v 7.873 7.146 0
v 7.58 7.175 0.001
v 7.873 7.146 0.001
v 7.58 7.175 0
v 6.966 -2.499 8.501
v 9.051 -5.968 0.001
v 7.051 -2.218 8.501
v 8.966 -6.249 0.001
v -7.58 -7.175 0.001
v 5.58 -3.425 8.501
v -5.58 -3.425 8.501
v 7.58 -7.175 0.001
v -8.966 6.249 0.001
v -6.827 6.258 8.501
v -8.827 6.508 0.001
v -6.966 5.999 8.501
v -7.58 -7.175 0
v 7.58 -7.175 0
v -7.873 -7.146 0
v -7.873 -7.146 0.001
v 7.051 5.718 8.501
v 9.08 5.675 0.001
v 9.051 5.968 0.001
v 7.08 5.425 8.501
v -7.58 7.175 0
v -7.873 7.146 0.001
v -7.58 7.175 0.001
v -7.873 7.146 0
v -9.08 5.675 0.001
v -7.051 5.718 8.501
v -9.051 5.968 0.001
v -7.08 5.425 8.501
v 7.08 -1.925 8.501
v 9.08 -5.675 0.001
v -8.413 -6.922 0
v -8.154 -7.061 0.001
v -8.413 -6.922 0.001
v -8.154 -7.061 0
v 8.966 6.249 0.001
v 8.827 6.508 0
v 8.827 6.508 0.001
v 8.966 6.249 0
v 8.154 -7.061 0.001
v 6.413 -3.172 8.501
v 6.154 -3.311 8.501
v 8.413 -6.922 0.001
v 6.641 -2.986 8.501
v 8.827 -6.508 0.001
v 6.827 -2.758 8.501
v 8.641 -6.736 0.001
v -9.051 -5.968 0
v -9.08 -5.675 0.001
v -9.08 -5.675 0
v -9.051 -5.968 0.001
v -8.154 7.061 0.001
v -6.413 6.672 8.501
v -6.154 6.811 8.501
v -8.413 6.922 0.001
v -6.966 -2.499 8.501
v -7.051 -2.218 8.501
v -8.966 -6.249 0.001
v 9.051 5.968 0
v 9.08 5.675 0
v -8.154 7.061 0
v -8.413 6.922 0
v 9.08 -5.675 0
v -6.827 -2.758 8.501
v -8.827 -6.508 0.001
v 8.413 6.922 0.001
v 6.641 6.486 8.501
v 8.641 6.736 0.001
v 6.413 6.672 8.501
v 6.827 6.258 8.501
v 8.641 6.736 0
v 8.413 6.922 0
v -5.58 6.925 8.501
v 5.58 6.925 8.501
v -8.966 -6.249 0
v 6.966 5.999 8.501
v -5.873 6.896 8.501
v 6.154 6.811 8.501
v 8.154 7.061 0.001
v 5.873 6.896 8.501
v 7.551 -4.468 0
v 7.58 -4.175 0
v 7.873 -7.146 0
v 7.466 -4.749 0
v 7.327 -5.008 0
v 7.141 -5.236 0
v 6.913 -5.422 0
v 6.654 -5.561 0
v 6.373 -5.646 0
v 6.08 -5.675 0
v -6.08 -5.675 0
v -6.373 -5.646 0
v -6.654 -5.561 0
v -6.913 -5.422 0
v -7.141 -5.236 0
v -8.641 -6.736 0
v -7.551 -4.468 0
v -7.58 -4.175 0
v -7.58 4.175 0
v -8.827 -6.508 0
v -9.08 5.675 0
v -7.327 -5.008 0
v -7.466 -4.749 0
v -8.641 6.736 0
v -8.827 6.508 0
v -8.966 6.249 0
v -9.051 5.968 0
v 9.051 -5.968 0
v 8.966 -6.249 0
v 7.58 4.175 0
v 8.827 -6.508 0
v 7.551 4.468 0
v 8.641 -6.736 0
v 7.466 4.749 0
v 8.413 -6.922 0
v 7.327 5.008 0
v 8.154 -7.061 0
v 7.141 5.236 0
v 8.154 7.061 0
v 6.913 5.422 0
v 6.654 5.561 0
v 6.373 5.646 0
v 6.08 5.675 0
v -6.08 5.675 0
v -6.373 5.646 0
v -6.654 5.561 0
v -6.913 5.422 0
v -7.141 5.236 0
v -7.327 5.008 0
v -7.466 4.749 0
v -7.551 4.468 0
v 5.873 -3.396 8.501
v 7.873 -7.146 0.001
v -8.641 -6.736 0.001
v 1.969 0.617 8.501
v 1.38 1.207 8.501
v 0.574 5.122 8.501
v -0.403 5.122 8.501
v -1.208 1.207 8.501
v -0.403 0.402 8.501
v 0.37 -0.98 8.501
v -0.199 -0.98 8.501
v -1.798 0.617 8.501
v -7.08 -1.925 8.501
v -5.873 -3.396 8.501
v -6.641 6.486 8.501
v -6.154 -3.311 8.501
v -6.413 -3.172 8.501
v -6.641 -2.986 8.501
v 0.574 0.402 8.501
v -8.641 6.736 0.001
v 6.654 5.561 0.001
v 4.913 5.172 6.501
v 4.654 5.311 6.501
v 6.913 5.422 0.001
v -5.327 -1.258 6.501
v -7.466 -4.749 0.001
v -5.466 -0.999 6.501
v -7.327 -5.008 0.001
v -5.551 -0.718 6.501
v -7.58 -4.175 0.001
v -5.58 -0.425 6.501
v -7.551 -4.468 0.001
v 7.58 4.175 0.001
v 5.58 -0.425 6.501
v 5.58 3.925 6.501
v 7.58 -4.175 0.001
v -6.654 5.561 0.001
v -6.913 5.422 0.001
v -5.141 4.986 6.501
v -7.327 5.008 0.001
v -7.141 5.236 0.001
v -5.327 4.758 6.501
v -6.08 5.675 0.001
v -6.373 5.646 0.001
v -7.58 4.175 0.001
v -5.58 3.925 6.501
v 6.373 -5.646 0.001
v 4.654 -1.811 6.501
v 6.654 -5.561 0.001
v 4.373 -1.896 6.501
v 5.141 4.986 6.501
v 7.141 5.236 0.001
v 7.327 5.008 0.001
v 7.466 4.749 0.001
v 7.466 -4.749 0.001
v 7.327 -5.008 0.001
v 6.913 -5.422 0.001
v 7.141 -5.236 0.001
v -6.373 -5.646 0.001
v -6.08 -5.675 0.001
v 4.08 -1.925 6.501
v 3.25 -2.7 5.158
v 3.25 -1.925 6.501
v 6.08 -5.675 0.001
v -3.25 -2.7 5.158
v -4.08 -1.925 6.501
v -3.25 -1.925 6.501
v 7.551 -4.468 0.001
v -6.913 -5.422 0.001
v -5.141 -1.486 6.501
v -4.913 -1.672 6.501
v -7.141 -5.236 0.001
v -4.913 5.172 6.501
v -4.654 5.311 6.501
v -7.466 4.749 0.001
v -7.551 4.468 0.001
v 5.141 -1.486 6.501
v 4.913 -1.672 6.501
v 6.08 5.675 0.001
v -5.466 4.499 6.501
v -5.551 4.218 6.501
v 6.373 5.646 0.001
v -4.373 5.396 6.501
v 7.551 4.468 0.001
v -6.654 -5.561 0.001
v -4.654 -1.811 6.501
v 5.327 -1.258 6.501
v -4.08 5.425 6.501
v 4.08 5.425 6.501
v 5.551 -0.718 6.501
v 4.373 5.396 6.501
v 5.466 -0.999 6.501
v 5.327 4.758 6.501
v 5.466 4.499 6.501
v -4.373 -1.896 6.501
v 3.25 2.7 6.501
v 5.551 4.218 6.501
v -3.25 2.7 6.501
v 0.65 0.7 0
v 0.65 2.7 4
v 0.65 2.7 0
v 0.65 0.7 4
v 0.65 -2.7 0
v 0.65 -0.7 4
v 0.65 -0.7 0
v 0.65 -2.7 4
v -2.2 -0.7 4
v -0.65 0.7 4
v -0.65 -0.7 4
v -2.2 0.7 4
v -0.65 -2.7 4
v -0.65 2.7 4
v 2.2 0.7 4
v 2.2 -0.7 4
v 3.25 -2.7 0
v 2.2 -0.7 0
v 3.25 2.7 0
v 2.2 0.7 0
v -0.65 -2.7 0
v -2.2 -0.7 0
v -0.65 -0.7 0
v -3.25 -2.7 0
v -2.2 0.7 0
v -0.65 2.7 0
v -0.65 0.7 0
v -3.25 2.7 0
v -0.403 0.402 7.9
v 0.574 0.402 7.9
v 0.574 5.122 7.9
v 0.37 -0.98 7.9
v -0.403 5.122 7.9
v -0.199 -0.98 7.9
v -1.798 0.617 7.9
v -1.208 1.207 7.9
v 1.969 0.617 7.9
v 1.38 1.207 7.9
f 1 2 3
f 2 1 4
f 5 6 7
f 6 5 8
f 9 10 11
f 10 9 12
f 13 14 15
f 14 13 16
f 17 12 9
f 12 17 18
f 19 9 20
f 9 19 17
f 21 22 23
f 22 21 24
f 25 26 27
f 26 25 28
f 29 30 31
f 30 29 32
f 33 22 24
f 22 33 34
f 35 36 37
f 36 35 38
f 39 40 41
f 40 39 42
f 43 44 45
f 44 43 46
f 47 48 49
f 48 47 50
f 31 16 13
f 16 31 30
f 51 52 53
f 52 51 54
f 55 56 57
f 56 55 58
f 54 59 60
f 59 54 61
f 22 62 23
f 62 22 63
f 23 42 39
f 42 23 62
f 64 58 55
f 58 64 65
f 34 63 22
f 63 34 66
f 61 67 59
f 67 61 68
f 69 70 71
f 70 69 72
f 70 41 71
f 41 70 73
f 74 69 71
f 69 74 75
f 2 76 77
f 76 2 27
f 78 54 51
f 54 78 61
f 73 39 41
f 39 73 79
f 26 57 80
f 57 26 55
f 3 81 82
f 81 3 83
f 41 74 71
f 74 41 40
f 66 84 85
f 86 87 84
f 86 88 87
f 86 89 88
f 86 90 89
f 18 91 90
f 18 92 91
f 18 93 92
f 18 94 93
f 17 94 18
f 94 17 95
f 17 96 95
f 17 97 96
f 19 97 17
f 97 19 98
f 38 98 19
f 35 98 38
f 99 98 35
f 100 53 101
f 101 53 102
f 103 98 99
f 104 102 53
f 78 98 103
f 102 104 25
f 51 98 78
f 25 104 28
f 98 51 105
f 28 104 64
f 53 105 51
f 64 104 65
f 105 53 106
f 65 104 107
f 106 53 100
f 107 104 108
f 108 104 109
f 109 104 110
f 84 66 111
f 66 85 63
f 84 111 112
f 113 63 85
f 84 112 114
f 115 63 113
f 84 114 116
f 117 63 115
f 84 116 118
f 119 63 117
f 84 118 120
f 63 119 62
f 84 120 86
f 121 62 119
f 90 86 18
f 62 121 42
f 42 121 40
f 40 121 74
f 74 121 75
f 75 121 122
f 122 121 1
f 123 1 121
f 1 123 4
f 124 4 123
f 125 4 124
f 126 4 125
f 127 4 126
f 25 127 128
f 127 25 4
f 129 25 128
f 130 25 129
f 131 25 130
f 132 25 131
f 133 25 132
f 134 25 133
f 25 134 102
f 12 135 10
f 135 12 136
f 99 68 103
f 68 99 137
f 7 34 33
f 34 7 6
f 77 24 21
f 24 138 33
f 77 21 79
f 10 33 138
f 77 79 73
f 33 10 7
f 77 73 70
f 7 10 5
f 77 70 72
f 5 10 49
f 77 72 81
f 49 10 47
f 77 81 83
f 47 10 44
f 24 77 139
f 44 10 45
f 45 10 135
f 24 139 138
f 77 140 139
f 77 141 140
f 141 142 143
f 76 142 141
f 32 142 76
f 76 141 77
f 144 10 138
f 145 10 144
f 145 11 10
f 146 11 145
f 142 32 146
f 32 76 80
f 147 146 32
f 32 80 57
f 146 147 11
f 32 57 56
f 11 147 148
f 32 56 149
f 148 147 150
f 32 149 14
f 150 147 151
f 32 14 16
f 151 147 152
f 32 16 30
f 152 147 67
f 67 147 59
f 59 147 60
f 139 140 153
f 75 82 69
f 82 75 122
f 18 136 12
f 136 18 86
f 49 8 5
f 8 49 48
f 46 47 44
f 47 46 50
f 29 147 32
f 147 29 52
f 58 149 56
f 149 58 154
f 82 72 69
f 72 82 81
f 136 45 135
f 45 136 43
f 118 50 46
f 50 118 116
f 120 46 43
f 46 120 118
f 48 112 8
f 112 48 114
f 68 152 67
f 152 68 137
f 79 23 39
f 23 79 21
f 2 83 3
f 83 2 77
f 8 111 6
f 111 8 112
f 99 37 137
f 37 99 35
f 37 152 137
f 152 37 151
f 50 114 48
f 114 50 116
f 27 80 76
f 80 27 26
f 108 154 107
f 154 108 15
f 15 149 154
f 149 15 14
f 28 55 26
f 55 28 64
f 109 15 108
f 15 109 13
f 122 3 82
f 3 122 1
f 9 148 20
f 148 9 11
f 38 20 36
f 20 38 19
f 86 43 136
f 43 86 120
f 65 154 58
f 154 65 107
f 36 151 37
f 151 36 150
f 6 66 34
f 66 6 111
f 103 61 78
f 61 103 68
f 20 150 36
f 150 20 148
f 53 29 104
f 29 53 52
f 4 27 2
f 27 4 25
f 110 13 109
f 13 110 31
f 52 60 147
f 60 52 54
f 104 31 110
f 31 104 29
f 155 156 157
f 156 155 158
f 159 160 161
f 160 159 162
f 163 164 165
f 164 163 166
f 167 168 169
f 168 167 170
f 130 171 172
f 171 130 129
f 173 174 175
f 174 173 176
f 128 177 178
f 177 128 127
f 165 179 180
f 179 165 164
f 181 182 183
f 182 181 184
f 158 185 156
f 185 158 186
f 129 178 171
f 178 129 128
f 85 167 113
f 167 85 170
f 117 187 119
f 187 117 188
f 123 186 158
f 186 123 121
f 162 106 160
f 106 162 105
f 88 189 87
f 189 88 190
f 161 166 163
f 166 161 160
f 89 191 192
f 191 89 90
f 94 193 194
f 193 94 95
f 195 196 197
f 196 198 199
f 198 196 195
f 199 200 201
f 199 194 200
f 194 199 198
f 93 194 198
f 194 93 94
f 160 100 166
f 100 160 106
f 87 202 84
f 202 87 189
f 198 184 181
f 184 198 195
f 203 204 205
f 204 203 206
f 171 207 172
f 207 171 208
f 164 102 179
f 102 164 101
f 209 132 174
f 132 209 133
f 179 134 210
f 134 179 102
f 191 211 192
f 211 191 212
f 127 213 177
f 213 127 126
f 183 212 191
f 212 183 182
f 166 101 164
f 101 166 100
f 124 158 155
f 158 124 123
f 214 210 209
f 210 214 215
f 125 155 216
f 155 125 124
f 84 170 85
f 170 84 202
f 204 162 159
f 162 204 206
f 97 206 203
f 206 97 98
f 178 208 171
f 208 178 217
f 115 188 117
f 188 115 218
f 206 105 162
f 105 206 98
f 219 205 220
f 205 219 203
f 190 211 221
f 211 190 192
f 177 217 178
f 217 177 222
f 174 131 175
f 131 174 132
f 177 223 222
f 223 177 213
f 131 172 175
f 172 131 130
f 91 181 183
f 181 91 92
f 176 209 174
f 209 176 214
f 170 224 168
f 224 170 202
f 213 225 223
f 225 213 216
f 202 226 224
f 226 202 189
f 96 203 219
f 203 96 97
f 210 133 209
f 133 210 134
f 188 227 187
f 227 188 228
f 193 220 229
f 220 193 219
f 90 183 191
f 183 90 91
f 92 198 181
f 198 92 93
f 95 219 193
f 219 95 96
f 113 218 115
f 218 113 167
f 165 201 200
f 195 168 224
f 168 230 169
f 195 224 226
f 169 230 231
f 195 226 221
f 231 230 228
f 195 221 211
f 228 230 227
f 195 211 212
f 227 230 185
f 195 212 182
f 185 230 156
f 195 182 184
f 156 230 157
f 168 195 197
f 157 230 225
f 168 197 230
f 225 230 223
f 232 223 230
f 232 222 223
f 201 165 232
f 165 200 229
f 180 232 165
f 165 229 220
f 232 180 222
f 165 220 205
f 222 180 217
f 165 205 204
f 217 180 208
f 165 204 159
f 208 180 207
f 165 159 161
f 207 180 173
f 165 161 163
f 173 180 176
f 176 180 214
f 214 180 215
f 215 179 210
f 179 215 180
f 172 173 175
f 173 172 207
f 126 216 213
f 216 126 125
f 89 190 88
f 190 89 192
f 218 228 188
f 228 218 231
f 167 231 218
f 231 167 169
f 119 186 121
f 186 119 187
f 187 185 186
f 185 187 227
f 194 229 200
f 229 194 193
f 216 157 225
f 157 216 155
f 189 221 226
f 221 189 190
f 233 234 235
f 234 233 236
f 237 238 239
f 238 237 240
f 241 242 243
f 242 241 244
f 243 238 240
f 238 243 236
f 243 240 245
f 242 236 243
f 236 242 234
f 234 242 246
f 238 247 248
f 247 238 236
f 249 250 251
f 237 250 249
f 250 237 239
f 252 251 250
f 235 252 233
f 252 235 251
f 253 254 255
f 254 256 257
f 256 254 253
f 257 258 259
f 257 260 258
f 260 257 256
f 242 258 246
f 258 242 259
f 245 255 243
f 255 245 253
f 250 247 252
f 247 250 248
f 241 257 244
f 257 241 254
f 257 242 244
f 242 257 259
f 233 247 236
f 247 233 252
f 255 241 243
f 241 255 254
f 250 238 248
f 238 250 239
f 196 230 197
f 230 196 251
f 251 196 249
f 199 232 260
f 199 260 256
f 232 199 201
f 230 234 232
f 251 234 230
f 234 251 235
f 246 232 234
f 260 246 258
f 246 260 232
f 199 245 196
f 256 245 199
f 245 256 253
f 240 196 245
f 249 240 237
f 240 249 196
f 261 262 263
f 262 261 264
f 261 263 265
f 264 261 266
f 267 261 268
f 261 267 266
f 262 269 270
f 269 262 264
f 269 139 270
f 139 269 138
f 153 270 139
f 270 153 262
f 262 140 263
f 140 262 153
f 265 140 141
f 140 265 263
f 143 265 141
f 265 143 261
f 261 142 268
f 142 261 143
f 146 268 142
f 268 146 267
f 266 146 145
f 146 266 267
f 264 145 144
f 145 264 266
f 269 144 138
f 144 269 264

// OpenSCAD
/* Borrowed from https://www.thingiverse.com/thing:468651 */

/* [Key] */

//length in units of key
key_length = 1;
//height in units of key. This seems to be it from eyeballing it.
key_height = 0.8;

//keycap type, [0:DCS Row 5, 1:DCS Row 1, 2:DCS Row 2, 3:DCS Row 3, 4:DCS Row 4, 5:DSA Row 3, 6:SA Row 1, 7:SA Row 2, 8:SA Row 3, 9:SA Row 4, 10:DCS Row 4 Spacebar, 11: g20 key (faked)]
key_profile_index = 0;

// keytop thickness, aka how many millimeters between the inside and outside of the top surface of the key
keytop_thickness = 2;

// wall thickness, aka the thickness of the sides of the keycap. note this is the total thickness, aka 3 = 1.5mm walls
wall_thickness = 3;

// text to show on the key
key_text = "↓";

// how deep the key text marking should be
key_text_depth = .6;

// marking font size. 6 works well for characters, 3 works well for dense text
key_text_fontsize = 6;

/* [Brim] */
//enable brim for connector
has_brim = 0;
//brim radius. 11 ensconces normal keycap stem in normal keycap
brim_radius = 11;
//brim depth
brim_depth = .3;

/* [Stabilizers] */
//whether stabilizer connectors are enabled
stabilizers = 0;
//stabilizer distance in mm
stabilizer_distance = 50;

/* [Dish] */
// invert dishing. mostly for spacebar
inverted_dish = 0;

/* [Stem] */
// cherry MX or Alps stem, or totally broken circular cherry stem [0..2]
stem_profile = 0;
// how inset the stem is from the bottom of the key. experimental. requires support
stem_inset = 0;
// stem offset in units NOT MM. for stepped caps lock
stem_offset = 0;

/* [Hidden] */
//change to round things better
$fn = 32;
//beginning to use unit instead of baked in 19.05
unit = 19.05;

//minkowski radius. radius of sphere used in minkowski sum for minkowski_key function. 1.75 default for faux G20
minkowski_radius = 1.75;

//profile specific stuff

/*
 Here we have, for lack of a better implementation, an array
 that defines the more intimate aspects of a key.
 order is thus:
 1. Bottom Key Width: width of the immediate bottom of the key
 2. Bottom Key Height: height of the immediate bottom of the key
 3. Top Key Width Difference: mm to subtract from bottom key width to create top key width
 4. Top Key Height Difference: mm to subtract from bottom key height to create top key height
 5. total Depth: how tall the total in the switch is before dishing
 6. Top Tilt: X rotation of the top. Top and dish obj are rotated
 7. Top Skew: Y skew of the top of the key relative to the bottom. DCS has some, DSA has none (its centered)
 8. Dish Type: type of dishing. check out dish function for the options
 9. Dish Depth: how many mm to cut into the key with
 10. Dish Radius: radius of dish obj, the Sphere or Cylinder that cuts into the keycap
*/

key_profiles = [

	//DCS Profile
	[ // Normal Key
		18.16,  // Bottom Key Width
		18.16,  // Bottom Key Height
		4,   // Top Key Width Difference
		4,   // Top Key Height Difference
		8.5, // total Depth
		0,  // Top Tilt
		1.75,// Top Skew
	],
];

// derived variables
//key profile selected
key_profile = key_profiles[key_profile_index];

// names, so I don't go crazy
bottom_key_width = key_profile[0];
bottom_key_height = key_profile[1];
width_difference = key_profile[2];
height_difference = key_profile[3];
total_depth = key_profile[4];
top_tilt = key_profile[5] / key_height;
top_skew = key_profile[6];

// actual mm key width and height
total_key_width = bottom_key_width + (unit * (key_length - 1));
total_key_height = bottom_key_height + (unit * (key_height - 1));

// actual mm key width and height at the top
top_total_key_width = bottom_key_width + (unit * (key_length - 1)) - width_difference;
top_total_key_height = bottom_key_height + (unit * (key_height - 1)) - height_difference;

//centered
module roundedRect(size, radius) {
	x = size[0];
	y = size[1];
	z = size[2];

	translate([-x/2,-y/2,0])
	linear_extrude(height=z)
	hull() {
		translate([radius, radius, 0])
		circle(r=radius);

		translate([x - radius, radius, 0])
		circle(r=radius);

		translate([x - radius, y - radius, 0])
		circle(r=radius);

		translate([radius, y - radius, 0])
		circle(r=radius);
	}
}

// stem related stuff

// bottom we can use to anchor the stem, just a big ol cube with the inside of
// the keycap hollowed out
module inside(){
	difference(){
		translate([0,0,50]) cube([100000,100000,100000],center=true);
		// NOTE: you're saying hey, if this is the inside why aren't we doing
		// wall_thickness, keytop_thickness? well first off congratulations for
		// figuring that out cuz it's a rat's nest in here. second off
		// due to how the minkowski_key function works that isn't working out right
		// now. it's a simple change if is_minkowski is implemented though
		shape(0, 0);
	}
}

module cherry_stem(){
	// cross length
	cross_length = 4.4;
  //extra vertical cross length - the extra length of the up/down bar of the cross
  extra_vertical_cross_length = 1.1;
	//dimensions of connector
	// outer cross extra length in x
	extra_outer_cross_width = 2.10;
	// outer cross extra length in y
	extra_outer_cross_height = 1.0;
	// dimensions of cross
	// horizontal cross bar width
	horizontal_cross_width = 1.4;
	// vertical cross bar width
	vertical_cross_width = 1.3;
	// cross depth, stem height is 3.4mm
	cross_depth = 4;

	difference(){
		union(){
            if (stem_profile != 2){
                translate([
                    -(cross_length+extra_outer_cross_width)/2,
                    -(cross_length+extra_outer_cross_height)/2,
                    stem_inset
                ])
    			cube([ // the base of the stem, the part the cruciform digs into
					cross_length+extra_outer_cross_width,
					cross_length+extra_outer_cross_height,
					50
    			]);
            } else {
                cylinder(
                    d = cross_length+extra_outer_cross_height,
                    h = 50
                );
            }
			if (has_brim == 1){ cylinder(r=brim_radius,h=brim_depth); }
		}
		//the cross part of the steam
		translate([0,0,(cross_depth)/2 + stem_inset]){
	        cube([vertical_cross_width,cross_length+extra_vertical_cross_length,cross_depth], center=true );
	        cube([cross_length,horizontal_cross_width,cross_depth], center=true );
	    }
	}
}

module alps_stem(){
	cross_depth = 40;
	width = 4.45;
	height = 2.25;

	base_width = 12;
	base_height = 15;

	translate([0,0,cross_depth/2 + stem_inset]){
		cube([width,height,cross_depth], center = true);
	}
}

//whole connector, alps or cherry, trimmed to fit
module connector(has_brim){
	difference(){
		//TODO can I really not do an array index here?
		translate([-unit * stem_offset, 0, 0])
		union(){
			if(stem_profile == 0 || stem_profile == 2) cherry_stem();
			if(stem_profile == 1) alps_stem();
		}
		inside();
	}
}

//stabilizer connectors
module stabilizer_connectors(has_brim){
	translate([stabilizer_distance,0,0]) connector(has_brim);
	translate([-stabilizer_distance,0,0]) connector(has_brim);
}



//shape related stuff

//general shape of key. used for inside and outside
module shape(thickness_difference, depth_difference){
    shape_hull(thickness_difference, depth_difference, 1);
}

// conicalish clipping shape to trim things off the outside of the keycap
// literally just a key with height of 2 to make sure nothing goes awry with dishing etc
module outside(thickness_difference){
	difference(){
		cube([100000,100000,100000],center = true);
		shape_hull(thickness_difference, 0, 2);
	}
}

// super basic hull shape without dish
// modifier multiplies the height and top differences of the shape,
// which is only used for dishing to cut the dish off correctly
// height_difference used for keytop thickness
module shape_hull(thickness_difference, depth_difference, modifier){
	hull(){
		// bottom_key_width + (key_length -1) * unit is the correct length of the
		// key. only 1u of the key should be bottom_key_width long; all others
		// should be 1u
		roundedRect([total_key_width - thickness_difference, total_key_height - thickness_difference, .001],1.5);

		//height_difference outside of modifier because that doesnt make sense
		translate([0,top_skew,total_depth * modifier - depth_difference])
		rotate([-top_tilt,0,0])
		roundedRect([total_key_width - thickness_difference - width_difference * modifier, total_key_height - thickness_difference - height_difference * modifier, .001],1.5);
	}
}


//actual full key with space carved out and keystem/stabilizer connectors
module key(){
	union(){
		difference(){
			shape(0, 0);
			shape(wall_thickness, keytop_thickness);
		}
	}

	connector(has_brim);

	if (stabilizers == 1){
		stabilizer_connectors(has_brim);
	}
}

// ACTUAL OUTPUT
difference(){
	key();
    
    translate([0, (total_key_height - top_total_key_height) / 2, total_depth - key_text_depth]) linear_extrude(height = 10) {
        text(text = key_text, font = "IBM Plex Mono:style=Bold", size = key_text_fontsize, halign = "center", valign = "center");
    }
	// preview cube, for seeing inside the keycap
	//cube([100,100,100]);
}

// NOT 3D, NOT CENTERED
// corollary is roundedRect
module fakeISOEnter(thickness_difference){
    z = 0.001;
    radius = 2;
		/*TODO I figured it out. 18.16 is the actual keycap width / height,
		whereas 19.01 is the unit. ISO enter obeys that just like everything else,
		which means that it's height is 18.16 * 2 + (19.01 - 18.16) or, two
		keycap heights plus the space between them, also known as 18.16 +
		(19.01 * (key_height - 1)). this is followed by the width too. should fix
		to make this finally work*/
    unit = 18.16; // TODO probably not

		// t is all modifications to the polygon array
		t = radius + thickness_difference/2;

    pointArray = [
        [0 + t,0 + t],
        [unit*1.25 - t, 0 + t],
        [unit*1.25  - t, unit*2  - t],
        [unit*-.25 + t, unit*2  - t],
        [unit*-.25 + t, unit*1  + t],
        [0 + t, unit*1  + t]
    ];

    minkowski(){
        circle(r=radius, $fn=24);
        polygon(points=pointArray);
    }
}

//corollary is shape_hull
module ISOEnterShapeHull(thickness_difference, depth_difference, modifier){
    unit = 18.16; // TODO probably not
		height = 8 - depth_difference;
		length = 1.5 * unit; // TODO not used. need for dish

    translate([-0.125 * unit, unit*.5]) linear_extrude(height=height*modifier, scale=[.8, .9]){
        translate([-unit*.5, -unit*1.5]) minkowski(){
            fakeISOEnter(thickness_difference);
        }
    }
}
